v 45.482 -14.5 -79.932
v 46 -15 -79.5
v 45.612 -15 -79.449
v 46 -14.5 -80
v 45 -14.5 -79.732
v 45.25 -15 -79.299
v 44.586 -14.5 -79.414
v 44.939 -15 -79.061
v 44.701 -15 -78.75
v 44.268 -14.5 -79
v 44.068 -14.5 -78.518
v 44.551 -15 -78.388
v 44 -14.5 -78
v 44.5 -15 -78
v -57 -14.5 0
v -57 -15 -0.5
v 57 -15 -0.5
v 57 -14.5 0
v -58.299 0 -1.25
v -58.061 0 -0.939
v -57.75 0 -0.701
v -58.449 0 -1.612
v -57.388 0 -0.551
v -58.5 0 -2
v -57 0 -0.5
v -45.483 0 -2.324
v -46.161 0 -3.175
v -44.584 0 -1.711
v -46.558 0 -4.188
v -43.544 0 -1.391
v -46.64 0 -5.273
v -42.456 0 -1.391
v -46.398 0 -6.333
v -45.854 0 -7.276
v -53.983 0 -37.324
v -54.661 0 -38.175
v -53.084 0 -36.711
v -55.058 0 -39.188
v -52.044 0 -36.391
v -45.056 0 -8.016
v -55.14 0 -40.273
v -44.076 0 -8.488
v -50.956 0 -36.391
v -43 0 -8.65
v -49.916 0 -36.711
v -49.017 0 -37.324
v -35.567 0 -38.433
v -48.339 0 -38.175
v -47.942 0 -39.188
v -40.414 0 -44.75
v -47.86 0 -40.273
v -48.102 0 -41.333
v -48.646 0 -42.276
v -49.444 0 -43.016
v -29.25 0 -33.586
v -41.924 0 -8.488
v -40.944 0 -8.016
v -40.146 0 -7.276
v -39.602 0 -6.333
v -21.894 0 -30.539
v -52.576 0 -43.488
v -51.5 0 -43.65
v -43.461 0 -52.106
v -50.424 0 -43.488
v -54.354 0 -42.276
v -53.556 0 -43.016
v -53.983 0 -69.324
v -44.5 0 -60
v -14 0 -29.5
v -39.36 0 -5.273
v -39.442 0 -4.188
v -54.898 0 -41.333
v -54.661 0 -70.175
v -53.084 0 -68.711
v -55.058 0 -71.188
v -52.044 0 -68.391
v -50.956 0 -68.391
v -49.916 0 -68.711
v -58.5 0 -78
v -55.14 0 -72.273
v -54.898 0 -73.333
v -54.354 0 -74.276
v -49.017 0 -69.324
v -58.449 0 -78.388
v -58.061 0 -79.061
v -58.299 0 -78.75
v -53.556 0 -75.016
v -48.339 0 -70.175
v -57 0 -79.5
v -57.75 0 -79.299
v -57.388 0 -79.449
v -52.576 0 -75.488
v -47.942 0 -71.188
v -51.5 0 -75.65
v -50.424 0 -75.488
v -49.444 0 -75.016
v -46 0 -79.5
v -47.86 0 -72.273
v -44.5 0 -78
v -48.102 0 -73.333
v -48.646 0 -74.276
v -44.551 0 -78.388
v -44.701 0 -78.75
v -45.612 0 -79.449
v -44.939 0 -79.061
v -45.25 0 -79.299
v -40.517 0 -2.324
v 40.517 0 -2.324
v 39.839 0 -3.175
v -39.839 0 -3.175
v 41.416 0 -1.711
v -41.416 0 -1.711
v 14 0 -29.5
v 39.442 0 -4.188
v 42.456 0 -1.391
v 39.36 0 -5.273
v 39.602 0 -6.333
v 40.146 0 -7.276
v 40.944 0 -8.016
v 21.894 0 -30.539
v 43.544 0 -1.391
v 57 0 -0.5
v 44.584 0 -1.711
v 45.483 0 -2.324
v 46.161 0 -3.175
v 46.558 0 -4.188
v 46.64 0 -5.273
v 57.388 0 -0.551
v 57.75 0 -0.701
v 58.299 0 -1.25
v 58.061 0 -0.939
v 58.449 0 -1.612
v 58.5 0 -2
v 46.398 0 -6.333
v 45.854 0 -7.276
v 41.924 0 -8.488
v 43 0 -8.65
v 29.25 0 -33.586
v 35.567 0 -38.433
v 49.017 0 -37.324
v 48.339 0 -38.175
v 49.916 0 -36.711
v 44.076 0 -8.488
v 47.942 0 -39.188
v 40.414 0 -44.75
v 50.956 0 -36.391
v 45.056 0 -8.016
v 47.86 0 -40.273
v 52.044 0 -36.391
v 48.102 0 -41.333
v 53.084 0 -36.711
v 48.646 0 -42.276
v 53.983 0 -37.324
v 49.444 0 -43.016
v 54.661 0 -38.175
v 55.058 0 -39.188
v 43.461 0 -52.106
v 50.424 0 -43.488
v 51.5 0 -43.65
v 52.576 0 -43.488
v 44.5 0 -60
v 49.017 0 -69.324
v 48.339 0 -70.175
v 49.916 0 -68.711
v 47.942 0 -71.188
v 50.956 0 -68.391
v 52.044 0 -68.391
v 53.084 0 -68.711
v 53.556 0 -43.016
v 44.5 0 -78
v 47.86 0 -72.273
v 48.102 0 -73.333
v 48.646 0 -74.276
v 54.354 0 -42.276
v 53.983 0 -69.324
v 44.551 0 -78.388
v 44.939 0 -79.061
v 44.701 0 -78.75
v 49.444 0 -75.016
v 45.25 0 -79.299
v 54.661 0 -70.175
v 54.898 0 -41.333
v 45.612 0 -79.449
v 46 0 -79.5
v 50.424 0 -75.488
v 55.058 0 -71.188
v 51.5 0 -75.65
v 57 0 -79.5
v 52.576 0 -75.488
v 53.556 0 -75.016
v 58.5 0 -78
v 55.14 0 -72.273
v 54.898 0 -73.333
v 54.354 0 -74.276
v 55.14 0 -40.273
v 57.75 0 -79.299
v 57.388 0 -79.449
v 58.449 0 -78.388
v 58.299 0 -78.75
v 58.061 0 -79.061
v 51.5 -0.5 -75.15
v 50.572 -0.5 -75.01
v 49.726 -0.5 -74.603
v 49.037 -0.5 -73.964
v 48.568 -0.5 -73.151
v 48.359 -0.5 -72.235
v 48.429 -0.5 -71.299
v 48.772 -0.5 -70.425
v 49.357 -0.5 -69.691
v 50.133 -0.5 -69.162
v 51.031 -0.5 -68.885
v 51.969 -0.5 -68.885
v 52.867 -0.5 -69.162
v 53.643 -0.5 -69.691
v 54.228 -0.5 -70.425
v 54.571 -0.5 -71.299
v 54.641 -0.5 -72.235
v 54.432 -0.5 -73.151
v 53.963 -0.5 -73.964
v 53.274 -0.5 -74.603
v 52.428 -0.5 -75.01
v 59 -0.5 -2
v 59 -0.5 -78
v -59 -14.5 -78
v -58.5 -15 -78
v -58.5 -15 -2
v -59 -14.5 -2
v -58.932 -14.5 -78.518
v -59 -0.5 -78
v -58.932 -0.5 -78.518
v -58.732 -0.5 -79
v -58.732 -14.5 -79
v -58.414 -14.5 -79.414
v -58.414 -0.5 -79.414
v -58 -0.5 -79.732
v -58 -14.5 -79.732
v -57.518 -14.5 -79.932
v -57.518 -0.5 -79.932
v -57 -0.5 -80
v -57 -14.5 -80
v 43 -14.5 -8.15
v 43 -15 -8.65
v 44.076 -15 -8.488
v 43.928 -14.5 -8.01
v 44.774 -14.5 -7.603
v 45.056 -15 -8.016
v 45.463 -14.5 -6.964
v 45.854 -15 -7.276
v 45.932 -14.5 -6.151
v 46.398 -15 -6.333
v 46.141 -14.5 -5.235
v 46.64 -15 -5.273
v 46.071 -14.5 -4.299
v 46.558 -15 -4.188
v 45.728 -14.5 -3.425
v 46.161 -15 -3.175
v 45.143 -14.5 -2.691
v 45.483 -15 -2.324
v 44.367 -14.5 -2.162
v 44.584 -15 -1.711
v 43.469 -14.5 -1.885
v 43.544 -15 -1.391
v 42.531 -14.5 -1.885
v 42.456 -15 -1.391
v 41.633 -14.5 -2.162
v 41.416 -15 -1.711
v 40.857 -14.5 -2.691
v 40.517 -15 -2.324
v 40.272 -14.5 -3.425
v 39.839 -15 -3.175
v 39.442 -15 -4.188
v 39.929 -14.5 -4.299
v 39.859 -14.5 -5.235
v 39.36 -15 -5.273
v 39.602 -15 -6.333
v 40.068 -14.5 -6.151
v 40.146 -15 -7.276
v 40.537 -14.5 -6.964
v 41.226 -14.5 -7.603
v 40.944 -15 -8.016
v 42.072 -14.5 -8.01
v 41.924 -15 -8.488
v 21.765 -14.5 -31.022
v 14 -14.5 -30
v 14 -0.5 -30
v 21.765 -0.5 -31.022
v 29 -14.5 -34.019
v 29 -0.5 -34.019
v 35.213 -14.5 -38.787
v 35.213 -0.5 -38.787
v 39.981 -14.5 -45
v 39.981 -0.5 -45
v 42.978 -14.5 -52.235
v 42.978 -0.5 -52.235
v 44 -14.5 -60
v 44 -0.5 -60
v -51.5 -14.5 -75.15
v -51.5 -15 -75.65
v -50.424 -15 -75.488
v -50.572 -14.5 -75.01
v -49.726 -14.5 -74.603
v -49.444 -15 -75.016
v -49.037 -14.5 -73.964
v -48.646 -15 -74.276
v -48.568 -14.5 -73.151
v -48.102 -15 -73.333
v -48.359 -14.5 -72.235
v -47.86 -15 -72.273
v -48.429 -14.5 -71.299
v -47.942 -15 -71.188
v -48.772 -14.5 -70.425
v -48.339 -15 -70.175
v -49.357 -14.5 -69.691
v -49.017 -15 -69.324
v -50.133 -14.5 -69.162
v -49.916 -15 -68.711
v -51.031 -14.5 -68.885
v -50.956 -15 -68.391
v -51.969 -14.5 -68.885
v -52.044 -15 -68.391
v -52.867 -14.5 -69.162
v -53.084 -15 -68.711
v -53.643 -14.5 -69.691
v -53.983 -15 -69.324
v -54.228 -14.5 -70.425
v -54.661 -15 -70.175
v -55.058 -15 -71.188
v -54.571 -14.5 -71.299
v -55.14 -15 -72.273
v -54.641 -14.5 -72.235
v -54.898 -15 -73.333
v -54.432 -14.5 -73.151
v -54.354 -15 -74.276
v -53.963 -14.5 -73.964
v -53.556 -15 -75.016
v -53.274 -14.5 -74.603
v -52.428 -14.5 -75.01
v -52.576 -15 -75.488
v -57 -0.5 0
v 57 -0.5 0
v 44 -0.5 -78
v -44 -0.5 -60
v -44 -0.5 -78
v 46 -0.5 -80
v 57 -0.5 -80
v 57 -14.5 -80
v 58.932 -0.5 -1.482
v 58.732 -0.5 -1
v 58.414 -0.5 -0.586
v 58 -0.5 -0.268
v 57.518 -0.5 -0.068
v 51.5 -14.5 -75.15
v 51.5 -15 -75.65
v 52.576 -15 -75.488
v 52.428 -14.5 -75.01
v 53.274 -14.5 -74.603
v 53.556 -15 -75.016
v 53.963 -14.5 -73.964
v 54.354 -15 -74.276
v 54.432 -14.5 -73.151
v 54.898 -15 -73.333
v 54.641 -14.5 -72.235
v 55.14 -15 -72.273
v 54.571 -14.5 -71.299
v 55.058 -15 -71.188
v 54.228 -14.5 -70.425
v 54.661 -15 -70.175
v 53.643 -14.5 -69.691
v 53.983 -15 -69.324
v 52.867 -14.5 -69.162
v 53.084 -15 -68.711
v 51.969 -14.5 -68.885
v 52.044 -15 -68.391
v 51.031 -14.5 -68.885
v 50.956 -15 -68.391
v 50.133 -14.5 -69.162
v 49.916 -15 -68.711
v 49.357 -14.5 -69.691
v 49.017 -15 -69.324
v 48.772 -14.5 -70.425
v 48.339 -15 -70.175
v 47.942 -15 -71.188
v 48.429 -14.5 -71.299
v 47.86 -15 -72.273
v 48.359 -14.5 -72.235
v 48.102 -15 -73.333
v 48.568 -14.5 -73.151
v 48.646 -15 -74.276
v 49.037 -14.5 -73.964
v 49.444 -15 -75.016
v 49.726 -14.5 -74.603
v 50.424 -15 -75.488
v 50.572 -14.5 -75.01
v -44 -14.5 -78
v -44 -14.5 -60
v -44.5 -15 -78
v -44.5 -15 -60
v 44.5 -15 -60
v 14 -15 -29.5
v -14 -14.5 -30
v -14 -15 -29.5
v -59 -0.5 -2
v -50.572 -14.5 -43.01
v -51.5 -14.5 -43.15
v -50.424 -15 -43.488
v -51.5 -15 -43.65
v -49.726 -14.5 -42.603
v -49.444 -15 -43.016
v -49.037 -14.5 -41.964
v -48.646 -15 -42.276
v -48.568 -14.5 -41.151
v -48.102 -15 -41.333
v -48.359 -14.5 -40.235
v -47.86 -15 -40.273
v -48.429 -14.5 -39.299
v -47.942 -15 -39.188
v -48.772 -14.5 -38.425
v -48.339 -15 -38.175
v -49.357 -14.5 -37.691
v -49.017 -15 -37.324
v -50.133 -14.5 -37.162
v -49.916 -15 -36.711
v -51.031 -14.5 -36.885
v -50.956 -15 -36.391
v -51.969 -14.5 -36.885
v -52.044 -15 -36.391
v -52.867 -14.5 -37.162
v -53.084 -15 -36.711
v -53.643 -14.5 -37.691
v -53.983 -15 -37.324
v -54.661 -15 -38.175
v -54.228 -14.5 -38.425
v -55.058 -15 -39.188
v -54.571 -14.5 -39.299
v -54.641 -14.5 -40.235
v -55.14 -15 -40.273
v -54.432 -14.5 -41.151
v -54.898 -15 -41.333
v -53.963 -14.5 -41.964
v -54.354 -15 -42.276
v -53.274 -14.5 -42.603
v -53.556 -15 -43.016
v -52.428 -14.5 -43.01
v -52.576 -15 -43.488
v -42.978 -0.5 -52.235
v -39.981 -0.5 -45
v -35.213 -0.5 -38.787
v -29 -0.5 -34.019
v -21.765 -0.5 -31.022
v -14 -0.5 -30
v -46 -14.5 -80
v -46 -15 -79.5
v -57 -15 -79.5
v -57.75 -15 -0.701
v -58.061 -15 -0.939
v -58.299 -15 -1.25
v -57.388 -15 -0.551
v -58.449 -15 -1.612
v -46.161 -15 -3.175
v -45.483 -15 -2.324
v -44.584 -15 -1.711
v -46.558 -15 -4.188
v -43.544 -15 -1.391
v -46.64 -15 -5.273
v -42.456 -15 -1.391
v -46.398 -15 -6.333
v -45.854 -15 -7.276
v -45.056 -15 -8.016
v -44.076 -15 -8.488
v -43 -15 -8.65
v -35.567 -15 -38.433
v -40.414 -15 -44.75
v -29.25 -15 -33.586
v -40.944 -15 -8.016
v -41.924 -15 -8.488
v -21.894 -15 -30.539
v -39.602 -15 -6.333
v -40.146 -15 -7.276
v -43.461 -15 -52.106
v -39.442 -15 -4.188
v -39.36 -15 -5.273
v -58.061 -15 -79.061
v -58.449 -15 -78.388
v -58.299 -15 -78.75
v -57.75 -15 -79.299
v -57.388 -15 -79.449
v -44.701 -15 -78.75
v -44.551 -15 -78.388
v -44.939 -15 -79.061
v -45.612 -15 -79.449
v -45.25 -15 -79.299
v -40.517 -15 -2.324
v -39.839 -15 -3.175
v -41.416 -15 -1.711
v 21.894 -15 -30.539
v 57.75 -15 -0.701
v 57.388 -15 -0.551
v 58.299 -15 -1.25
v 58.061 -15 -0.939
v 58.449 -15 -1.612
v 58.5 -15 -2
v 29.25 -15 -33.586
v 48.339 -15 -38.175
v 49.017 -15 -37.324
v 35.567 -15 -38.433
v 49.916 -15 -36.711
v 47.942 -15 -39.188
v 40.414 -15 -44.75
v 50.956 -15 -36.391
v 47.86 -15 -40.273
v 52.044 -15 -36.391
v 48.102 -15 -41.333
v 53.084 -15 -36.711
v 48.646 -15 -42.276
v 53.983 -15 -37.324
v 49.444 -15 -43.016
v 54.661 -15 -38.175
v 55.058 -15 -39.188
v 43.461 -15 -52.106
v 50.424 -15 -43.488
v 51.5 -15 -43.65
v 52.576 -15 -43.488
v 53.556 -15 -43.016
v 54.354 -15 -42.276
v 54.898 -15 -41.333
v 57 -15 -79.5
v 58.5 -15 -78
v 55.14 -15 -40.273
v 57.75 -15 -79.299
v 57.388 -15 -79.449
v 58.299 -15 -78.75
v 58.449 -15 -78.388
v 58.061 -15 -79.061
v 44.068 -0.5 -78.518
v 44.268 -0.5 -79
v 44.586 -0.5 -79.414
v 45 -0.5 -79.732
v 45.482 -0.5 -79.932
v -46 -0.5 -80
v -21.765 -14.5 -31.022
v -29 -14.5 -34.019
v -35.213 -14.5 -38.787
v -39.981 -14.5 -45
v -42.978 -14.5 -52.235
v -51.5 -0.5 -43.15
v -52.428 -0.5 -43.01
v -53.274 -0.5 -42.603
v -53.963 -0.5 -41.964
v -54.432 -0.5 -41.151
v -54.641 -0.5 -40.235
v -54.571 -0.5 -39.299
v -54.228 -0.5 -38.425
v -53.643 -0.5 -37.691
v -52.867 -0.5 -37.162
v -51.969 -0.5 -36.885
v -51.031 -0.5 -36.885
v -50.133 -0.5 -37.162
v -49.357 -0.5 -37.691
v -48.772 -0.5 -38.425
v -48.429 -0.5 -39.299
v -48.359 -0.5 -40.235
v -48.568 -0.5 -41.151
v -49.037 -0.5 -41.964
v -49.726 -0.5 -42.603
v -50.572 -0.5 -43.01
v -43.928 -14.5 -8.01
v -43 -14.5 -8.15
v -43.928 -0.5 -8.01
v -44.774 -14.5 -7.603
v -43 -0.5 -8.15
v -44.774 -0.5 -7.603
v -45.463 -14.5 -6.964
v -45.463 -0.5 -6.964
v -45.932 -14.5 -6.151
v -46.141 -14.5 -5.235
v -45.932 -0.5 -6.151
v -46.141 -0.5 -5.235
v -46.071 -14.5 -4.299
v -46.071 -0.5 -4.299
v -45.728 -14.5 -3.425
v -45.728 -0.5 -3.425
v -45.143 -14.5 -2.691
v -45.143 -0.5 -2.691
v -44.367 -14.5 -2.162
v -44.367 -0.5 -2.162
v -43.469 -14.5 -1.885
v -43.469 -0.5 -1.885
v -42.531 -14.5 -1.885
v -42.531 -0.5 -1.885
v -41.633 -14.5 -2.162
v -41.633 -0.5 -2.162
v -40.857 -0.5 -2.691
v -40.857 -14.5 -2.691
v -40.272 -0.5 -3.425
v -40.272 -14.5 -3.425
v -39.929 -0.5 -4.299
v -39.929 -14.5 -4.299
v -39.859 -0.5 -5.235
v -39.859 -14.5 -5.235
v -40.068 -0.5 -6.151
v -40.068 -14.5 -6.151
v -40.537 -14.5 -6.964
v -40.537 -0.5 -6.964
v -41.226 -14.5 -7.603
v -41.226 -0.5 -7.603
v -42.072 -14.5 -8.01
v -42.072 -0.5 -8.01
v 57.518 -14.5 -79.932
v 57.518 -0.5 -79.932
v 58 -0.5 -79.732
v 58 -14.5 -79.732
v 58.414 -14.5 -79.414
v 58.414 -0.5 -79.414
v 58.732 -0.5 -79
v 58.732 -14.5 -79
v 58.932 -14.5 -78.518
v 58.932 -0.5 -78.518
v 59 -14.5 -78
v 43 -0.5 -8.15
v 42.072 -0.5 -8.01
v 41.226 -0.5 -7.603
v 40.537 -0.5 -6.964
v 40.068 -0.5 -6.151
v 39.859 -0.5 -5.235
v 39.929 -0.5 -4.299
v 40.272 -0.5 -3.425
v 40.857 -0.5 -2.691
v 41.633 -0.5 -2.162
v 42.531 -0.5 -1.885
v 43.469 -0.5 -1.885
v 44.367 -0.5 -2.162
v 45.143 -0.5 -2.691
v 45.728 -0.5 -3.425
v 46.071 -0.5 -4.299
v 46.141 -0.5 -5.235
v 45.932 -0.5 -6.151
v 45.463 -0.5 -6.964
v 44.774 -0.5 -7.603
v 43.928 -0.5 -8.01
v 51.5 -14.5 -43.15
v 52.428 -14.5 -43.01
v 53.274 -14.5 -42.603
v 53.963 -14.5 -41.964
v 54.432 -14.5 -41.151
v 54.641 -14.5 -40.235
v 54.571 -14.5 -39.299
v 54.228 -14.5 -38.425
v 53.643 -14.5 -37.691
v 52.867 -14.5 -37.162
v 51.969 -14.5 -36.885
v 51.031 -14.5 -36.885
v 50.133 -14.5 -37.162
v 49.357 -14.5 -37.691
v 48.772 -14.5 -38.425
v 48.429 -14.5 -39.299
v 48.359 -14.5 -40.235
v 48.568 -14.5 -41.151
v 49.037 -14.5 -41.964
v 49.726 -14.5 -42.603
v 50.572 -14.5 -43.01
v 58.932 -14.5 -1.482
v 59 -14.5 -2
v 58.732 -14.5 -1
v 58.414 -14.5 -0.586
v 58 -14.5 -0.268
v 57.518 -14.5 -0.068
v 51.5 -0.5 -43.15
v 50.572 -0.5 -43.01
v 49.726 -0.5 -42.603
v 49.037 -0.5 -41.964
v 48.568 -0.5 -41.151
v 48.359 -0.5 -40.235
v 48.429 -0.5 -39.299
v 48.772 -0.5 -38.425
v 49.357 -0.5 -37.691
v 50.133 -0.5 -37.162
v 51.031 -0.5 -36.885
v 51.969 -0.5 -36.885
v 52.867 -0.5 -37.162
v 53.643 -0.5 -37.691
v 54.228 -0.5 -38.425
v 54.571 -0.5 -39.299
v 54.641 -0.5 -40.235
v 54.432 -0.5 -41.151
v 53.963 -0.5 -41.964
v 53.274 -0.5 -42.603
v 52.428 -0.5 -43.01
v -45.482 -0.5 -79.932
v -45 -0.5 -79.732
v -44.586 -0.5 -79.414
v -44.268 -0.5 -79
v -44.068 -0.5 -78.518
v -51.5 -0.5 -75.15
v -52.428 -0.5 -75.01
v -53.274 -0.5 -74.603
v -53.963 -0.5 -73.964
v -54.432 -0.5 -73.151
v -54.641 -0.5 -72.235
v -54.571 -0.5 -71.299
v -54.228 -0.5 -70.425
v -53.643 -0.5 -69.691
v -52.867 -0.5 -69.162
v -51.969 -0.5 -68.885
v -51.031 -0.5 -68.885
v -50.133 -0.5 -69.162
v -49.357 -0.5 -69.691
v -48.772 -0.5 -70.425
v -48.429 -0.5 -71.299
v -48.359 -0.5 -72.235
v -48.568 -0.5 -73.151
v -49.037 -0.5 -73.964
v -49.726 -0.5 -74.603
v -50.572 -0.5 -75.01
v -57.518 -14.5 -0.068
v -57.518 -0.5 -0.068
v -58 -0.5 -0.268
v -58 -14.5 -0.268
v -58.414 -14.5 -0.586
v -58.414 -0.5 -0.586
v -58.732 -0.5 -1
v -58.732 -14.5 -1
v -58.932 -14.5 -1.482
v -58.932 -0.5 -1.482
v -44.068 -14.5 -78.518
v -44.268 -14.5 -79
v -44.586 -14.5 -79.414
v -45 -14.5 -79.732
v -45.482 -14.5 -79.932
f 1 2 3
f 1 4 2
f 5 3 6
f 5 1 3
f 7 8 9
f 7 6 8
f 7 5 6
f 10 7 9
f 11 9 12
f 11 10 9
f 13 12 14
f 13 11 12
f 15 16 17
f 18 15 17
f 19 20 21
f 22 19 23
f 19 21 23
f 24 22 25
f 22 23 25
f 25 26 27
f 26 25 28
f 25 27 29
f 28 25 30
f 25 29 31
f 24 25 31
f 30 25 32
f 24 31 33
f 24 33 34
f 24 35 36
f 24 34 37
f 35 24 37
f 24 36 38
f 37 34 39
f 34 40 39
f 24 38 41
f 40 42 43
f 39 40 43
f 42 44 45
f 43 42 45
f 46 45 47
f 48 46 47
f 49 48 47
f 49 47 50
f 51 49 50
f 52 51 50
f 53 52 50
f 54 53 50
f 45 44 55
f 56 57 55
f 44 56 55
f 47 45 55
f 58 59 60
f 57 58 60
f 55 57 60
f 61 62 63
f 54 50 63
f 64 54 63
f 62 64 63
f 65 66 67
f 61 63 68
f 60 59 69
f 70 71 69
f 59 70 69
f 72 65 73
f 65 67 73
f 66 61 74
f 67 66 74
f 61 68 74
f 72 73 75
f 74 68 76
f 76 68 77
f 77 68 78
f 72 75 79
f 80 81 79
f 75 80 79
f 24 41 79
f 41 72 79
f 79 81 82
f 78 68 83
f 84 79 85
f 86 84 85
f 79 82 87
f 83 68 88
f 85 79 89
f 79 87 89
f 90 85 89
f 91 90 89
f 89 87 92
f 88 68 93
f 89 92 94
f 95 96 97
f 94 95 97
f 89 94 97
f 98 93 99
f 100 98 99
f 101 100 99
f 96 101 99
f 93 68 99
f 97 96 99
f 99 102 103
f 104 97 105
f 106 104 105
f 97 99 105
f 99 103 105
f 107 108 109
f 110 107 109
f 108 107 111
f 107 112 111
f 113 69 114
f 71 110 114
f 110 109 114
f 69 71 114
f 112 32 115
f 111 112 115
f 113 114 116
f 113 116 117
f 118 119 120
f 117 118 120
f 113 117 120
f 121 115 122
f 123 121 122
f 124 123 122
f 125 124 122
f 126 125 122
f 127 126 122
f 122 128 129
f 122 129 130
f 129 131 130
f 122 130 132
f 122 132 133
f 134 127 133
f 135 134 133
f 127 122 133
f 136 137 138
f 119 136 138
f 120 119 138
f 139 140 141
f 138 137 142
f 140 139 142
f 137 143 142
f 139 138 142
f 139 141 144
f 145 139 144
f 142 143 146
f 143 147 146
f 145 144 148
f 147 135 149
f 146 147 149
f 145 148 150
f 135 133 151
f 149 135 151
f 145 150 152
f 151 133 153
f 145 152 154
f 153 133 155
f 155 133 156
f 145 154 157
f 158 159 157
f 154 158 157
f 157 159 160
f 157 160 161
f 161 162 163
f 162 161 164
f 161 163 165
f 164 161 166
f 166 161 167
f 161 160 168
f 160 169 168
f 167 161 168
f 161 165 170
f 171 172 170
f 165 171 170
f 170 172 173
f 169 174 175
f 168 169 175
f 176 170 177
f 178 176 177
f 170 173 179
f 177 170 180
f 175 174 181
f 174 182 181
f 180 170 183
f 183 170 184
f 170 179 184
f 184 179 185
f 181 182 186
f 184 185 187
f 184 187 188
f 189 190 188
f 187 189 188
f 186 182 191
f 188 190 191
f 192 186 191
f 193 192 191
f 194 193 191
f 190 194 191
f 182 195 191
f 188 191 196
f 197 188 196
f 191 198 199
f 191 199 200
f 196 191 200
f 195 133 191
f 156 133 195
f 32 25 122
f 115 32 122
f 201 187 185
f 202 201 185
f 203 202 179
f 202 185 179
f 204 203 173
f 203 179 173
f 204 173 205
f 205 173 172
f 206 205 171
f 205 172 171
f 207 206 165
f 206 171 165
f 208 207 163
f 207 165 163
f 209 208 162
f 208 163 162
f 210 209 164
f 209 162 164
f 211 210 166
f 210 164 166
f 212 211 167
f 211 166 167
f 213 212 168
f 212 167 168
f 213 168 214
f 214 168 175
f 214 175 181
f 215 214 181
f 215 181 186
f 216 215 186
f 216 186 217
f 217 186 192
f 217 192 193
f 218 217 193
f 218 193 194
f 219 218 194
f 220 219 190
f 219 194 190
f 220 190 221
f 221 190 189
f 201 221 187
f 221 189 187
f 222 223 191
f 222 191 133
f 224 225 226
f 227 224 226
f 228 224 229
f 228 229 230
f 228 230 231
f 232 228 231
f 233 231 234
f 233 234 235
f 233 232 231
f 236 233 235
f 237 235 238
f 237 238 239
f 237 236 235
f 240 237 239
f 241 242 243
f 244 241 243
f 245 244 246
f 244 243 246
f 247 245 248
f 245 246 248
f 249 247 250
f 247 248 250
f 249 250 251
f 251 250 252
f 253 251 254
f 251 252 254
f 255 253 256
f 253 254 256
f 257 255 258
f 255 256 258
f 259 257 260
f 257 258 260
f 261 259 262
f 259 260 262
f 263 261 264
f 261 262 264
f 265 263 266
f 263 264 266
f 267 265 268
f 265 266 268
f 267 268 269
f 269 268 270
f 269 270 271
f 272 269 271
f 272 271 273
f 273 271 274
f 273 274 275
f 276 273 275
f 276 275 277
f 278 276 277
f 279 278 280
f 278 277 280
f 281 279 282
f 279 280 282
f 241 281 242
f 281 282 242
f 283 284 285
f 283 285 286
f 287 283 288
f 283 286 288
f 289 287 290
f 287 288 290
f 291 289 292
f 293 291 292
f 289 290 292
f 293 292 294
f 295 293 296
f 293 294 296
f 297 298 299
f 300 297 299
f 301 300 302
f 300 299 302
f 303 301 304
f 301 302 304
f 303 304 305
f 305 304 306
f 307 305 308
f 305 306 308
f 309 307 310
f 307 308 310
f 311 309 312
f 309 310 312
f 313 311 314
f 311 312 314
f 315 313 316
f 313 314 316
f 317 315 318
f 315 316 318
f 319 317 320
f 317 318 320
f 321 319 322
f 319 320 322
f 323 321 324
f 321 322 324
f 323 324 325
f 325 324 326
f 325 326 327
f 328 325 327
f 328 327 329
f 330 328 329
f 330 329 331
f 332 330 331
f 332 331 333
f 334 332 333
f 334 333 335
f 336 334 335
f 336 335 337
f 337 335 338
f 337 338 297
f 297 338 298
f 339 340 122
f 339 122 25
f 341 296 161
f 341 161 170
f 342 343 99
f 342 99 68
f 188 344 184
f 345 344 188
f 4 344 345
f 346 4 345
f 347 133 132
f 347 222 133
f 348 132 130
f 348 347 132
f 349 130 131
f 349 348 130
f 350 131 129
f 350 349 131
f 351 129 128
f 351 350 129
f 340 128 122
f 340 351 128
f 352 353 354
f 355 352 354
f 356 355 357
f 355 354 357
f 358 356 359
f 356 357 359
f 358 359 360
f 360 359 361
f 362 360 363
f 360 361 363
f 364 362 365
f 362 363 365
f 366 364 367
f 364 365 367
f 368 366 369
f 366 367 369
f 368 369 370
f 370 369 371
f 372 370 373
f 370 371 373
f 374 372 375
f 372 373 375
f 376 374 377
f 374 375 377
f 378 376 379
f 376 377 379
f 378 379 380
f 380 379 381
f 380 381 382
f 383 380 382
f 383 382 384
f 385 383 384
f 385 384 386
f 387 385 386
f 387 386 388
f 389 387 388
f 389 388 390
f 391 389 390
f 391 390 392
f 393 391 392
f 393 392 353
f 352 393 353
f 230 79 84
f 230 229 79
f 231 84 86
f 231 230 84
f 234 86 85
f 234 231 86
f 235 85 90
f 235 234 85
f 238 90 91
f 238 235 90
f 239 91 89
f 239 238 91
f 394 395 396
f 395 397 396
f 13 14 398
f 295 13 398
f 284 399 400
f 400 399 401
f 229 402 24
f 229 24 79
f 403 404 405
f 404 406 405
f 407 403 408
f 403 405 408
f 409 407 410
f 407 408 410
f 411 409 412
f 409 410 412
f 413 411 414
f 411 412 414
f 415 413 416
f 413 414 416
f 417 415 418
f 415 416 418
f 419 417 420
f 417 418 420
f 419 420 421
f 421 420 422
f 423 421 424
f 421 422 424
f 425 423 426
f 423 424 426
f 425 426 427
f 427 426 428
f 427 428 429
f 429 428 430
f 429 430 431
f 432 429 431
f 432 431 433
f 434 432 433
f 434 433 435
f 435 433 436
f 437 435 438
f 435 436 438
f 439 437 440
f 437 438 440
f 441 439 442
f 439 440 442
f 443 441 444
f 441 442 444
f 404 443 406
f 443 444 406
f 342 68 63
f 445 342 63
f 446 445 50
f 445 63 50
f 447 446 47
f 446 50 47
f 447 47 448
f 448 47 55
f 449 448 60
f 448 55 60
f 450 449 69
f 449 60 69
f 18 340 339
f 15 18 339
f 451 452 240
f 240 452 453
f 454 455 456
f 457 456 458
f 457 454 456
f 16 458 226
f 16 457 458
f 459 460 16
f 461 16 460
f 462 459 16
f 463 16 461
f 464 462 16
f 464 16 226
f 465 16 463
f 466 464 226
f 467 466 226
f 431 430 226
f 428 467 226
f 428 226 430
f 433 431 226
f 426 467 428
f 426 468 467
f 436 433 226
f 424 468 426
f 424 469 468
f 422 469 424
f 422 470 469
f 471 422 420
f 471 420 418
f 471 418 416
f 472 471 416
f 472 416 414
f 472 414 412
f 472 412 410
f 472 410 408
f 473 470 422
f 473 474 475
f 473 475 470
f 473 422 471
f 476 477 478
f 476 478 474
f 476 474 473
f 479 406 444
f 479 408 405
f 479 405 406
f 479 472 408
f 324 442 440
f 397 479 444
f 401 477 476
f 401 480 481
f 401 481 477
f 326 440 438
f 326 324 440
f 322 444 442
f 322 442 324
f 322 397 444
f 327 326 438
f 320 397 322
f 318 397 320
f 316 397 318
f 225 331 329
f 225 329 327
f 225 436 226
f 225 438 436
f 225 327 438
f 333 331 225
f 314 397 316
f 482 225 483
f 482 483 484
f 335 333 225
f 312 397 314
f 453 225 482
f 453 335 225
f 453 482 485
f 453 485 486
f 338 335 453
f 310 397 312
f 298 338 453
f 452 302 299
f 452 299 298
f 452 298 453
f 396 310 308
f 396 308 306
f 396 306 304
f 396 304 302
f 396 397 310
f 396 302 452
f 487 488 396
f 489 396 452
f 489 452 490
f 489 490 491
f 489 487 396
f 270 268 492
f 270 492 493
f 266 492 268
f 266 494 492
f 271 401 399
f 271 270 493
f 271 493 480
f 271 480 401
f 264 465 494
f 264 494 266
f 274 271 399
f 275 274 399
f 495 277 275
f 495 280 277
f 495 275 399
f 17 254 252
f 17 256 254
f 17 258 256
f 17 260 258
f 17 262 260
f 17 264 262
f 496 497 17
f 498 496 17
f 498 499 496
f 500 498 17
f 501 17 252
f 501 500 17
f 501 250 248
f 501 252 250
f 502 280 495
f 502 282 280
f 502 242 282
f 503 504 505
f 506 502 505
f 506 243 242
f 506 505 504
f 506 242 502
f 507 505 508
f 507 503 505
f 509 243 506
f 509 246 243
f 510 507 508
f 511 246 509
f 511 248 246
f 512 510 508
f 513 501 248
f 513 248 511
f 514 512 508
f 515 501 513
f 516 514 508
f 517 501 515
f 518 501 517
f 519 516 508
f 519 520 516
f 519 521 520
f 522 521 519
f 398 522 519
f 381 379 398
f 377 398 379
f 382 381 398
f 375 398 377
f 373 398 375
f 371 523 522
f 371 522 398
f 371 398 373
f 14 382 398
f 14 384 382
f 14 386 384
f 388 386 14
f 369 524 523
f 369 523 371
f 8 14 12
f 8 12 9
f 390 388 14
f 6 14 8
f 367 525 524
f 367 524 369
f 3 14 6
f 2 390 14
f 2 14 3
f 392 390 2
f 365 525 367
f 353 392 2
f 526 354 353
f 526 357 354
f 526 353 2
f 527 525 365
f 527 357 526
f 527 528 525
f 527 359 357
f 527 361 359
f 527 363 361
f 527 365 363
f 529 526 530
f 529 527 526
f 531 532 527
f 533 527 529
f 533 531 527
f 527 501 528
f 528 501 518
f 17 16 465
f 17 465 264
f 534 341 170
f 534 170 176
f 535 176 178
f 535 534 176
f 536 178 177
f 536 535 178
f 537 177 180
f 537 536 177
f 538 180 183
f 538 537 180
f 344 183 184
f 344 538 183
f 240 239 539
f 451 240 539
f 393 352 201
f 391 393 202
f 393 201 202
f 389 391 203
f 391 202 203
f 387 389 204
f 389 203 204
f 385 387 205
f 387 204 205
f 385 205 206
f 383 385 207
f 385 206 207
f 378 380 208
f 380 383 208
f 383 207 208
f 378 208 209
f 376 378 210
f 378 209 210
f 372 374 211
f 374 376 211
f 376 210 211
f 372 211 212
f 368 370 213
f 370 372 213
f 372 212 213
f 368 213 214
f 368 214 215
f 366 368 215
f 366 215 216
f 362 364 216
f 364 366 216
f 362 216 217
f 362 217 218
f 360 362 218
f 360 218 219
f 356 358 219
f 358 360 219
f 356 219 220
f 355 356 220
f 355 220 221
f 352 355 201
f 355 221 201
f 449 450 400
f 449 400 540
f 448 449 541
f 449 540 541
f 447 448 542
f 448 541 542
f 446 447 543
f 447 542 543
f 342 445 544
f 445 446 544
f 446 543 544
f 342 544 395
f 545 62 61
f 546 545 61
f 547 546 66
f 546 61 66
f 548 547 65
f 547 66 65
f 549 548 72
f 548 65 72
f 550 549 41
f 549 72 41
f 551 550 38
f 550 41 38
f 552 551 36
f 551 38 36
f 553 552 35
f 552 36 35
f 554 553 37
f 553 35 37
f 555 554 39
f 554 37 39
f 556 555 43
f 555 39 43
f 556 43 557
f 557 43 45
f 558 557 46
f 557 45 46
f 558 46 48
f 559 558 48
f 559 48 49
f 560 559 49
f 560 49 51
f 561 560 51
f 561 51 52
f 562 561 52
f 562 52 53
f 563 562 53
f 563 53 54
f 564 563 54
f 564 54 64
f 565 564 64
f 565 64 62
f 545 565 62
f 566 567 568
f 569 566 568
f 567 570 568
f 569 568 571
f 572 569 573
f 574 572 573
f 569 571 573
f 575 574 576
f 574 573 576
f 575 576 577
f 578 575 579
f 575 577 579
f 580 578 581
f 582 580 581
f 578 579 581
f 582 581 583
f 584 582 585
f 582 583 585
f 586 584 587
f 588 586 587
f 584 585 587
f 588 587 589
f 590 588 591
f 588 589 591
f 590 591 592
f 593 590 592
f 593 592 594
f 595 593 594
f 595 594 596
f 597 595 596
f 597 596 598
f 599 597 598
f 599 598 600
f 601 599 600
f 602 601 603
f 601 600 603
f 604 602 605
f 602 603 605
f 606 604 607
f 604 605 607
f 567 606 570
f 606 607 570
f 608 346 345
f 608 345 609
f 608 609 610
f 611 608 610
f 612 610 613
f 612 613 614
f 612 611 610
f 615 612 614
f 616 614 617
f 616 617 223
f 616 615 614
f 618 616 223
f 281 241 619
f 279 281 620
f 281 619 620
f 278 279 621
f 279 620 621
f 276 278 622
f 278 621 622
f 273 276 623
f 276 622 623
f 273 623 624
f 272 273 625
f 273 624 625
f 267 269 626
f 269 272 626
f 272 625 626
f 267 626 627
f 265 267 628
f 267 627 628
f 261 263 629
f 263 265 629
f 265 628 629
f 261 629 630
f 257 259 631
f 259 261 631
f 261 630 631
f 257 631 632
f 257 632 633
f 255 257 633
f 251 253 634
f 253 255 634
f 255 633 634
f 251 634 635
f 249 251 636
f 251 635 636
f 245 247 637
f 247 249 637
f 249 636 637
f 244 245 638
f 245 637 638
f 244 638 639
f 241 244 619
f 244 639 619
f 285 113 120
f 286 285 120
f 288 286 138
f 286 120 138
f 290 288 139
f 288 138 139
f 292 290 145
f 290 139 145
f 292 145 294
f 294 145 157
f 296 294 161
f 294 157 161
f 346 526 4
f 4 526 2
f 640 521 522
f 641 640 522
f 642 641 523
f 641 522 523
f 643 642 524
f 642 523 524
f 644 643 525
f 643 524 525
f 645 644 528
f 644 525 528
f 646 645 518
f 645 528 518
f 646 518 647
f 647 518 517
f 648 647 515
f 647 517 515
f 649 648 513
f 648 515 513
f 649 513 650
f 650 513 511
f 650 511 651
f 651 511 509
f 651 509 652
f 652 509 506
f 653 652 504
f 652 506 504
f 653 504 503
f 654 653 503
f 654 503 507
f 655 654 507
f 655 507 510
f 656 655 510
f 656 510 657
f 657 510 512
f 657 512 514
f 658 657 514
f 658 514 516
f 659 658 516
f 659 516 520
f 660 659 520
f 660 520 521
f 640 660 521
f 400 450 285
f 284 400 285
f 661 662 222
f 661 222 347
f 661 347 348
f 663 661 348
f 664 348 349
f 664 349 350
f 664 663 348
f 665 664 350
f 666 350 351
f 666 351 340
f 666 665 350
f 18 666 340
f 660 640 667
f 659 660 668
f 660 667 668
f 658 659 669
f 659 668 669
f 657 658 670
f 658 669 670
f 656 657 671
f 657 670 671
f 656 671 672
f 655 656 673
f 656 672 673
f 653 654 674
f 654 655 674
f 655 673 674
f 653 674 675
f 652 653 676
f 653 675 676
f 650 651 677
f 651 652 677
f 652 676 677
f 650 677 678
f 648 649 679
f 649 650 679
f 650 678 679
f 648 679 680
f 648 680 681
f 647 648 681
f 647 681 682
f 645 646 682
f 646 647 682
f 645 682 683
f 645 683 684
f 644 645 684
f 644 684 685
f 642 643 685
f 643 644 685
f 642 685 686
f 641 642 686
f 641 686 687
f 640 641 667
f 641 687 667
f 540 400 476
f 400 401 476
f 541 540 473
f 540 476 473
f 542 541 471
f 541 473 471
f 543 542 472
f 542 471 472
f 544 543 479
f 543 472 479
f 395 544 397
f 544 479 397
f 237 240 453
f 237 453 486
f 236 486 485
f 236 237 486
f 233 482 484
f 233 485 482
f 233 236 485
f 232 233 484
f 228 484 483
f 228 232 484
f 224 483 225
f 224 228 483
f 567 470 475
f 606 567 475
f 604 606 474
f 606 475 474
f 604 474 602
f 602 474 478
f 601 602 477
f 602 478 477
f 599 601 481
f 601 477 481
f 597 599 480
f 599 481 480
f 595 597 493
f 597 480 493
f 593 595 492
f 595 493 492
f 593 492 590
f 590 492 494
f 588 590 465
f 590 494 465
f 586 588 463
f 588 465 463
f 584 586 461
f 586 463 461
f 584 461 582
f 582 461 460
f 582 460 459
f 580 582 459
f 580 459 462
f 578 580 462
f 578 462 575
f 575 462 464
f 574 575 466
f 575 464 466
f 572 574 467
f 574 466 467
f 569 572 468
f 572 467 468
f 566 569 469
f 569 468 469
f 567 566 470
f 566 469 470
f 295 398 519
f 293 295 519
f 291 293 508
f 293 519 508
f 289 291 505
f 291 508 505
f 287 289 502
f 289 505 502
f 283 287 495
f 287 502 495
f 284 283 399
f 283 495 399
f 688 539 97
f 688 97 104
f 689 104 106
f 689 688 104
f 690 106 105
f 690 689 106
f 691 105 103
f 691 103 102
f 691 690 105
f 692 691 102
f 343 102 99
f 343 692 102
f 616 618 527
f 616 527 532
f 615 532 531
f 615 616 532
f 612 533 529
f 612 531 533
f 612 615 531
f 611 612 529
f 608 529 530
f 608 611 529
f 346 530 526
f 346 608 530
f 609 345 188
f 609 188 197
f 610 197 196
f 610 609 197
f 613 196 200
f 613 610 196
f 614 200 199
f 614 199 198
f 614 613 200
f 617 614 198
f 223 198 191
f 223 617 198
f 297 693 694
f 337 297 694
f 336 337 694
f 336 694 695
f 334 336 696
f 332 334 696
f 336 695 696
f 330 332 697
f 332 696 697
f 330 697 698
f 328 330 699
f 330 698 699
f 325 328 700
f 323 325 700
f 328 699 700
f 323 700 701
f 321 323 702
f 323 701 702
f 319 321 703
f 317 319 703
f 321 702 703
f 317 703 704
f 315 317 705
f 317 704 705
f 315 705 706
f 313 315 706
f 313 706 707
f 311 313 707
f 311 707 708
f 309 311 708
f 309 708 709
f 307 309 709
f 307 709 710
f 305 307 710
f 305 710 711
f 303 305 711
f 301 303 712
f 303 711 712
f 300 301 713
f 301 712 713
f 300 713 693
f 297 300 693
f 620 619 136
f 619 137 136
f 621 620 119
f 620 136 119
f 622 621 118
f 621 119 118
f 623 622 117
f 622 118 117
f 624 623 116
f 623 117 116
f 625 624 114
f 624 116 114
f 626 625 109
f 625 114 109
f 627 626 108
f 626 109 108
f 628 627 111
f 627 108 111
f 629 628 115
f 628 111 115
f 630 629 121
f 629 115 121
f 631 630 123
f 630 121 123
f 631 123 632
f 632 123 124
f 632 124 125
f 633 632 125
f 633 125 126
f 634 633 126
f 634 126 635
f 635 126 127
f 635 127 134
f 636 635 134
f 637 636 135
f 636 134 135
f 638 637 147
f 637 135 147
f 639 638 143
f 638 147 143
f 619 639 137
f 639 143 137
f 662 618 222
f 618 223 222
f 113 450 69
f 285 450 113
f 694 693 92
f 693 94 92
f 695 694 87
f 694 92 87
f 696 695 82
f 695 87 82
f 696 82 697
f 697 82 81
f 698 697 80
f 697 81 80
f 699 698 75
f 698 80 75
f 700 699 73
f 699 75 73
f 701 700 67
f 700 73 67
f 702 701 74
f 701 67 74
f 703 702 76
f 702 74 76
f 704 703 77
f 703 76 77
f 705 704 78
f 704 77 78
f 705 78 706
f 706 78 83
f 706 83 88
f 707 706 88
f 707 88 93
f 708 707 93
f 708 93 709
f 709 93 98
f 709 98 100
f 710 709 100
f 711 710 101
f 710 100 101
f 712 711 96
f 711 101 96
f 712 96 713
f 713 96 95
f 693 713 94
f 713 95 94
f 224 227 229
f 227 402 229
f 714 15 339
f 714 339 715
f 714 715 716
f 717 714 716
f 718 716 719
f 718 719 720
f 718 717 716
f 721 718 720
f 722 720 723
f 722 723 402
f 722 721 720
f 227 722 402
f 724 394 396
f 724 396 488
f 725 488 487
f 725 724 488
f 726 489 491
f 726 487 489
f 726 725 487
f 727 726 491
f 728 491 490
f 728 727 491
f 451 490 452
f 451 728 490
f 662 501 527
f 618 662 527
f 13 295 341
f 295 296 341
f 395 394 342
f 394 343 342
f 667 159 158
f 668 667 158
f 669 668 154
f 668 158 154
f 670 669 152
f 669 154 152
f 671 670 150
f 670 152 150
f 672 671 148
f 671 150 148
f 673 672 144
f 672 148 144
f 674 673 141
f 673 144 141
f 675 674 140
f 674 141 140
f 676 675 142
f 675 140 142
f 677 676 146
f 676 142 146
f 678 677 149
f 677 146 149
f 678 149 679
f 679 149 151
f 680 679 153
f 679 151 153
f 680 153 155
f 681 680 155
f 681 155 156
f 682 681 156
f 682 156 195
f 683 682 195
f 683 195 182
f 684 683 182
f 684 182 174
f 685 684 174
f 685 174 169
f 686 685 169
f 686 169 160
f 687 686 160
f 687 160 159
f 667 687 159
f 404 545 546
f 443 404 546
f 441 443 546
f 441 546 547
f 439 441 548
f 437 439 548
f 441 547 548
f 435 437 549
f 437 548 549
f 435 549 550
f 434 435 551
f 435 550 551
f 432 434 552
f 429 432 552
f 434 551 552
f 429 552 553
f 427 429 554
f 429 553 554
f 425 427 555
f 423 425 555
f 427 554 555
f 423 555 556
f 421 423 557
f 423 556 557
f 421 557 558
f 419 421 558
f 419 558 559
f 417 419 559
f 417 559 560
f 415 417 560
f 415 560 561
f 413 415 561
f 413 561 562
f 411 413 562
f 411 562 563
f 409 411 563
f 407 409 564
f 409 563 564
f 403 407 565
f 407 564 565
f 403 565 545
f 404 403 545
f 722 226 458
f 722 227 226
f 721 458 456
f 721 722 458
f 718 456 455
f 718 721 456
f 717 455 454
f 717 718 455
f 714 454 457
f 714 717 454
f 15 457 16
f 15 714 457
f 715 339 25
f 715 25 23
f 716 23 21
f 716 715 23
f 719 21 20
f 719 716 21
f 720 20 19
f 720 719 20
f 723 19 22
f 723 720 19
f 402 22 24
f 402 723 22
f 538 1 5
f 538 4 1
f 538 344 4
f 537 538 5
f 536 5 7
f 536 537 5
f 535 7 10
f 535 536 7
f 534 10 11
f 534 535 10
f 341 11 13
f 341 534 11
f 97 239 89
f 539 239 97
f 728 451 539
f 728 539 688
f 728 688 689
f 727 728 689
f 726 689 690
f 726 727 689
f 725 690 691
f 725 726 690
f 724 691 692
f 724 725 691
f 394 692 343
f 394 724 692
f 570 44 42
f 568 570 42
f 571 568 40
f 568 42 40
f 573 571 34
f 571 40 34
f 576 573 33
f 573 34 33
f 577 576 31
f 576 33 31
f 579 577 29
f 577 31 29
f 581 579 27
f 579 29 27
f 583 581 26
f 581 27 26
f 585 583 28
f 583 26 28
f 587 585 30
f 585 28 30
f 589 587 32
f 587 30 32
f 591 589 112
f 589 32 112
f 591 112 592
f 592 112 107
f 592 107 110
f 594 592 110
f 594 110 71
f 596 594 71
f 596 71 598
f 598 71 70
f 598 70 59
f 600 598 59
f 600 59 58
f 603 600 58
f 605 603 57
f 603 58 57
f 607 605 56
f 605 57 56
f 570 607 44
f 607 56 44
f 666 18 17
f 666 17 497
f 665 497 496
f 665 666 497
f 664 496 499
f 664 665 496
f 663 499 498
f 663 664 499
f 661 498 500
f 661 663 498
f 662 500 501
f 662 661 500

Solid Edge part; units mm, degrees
sketch "Sketch1" plane through (0, 0, 0) normal (0, -1, 0) x (1, 0, 0)
  line L0 (59, 0) -> (-59, 0)
  line L1 (-59, 0) -> (-59, -80)
  line L2 (-59, -80) -> (59, -80)
  line L3 (59, -80) -> (59, 0)
extrude "Protrusion1" add sketch "Sketch1" along normal blind 15
sketch "Sketch2" plane through (0, 0, 0) normal (0, -1, 0) x (1, 0, 0)
  line L0 (-44, -30) -> (44, -30)
  line L1 (44, -30) -> (44, -110)
  line L2 (44, -110) -> (-44, -110)
  line L3 (-44, -110) -> (-44, -30)
extrude "Extrusionsausschnitt_1" cut sketch "Sketch2" along normal mid plane 380
fillet "Verrundung_1" radius 30 2 edges at (-44, -7.5, -30) (44, -7.5, -30)
hole "Bohrung_2" at (-51.5, -15, -72) direction (0, 1, 0) diameter 6.3 depth 30
hole "Hole1" at (-51.5, -15, -40) direction (0, 1, 0) diameter 6.3 depth 30
hole "Hole2" at (-43, -15, -5) direction (0, 1, 0) diameter 6.3 depth 30
mirror "Mirror1" about plane through (0, 0, 0) normal (1, 0, 0) of "Bohrung_2", "Hole1", "Hole2"
fillet "Verrundung_2" radius 2 6 edges at (-59, -7.5, 0) (-59, -7.5, -80) (-44, -7.5, -80) (44, -7.5, -80) (59, -7.5, -80) (59, -7.5, 0)
chamfer "Fase_2" distance 0.5 angle 45 22 edges at (51.5, -15, -68.85) (51.5, -15, -36.85) (43, -15, -1.85) (-43, -15, -1.85) (-51.5, -15, -36.85) (-51.5, -15, -68.85) (59, -15, -40) (58.4142, -15, -0.5858) (0, -15, 0) (-58.4142, -15, -0.5858) (-59, -15, -40) (-58.4142, -15, -79.4142) (-51.5, -15, -80) (-44.5858, -15, -79.4142) (-44, -15, -69) (-35.2132, -15, -38.7868) (0, -15, -30) (35.2132, -15, -38.7868) (44, -15, -69) (44.5858, -15, -79.4142) (51.5, -15, -80) (58.4142, -15, -79.4142)
chamfer "Fase_3" distance 0.5 angle 45 22 edges at (51.5, 0, -68.85) (51.5, 0, -36.85) (43, 0, -1.85) (-43, 0, -1.85) (-51.5, 0, -36.85) (-51.5, 0, -68.85) (0, 0, 0) (58.4142, 0, -0.5858) (59, 0, -40) (58.4142, 0, -79.4142) (51.5, 0, -80) (44.5858, 0, -79.4142) (44, 0, -69) (35.2132, 0, -38.7868) (0, 0, -30) (-35.2132, 0, -38.7868) (-44, 0, -69) (-44.5858, 0, -79.4142) (-51.5, 0, -80) (-58.4142, 0, -79.4142) (-59, 0, -40) (-58.4142, 0, -0.5858)
